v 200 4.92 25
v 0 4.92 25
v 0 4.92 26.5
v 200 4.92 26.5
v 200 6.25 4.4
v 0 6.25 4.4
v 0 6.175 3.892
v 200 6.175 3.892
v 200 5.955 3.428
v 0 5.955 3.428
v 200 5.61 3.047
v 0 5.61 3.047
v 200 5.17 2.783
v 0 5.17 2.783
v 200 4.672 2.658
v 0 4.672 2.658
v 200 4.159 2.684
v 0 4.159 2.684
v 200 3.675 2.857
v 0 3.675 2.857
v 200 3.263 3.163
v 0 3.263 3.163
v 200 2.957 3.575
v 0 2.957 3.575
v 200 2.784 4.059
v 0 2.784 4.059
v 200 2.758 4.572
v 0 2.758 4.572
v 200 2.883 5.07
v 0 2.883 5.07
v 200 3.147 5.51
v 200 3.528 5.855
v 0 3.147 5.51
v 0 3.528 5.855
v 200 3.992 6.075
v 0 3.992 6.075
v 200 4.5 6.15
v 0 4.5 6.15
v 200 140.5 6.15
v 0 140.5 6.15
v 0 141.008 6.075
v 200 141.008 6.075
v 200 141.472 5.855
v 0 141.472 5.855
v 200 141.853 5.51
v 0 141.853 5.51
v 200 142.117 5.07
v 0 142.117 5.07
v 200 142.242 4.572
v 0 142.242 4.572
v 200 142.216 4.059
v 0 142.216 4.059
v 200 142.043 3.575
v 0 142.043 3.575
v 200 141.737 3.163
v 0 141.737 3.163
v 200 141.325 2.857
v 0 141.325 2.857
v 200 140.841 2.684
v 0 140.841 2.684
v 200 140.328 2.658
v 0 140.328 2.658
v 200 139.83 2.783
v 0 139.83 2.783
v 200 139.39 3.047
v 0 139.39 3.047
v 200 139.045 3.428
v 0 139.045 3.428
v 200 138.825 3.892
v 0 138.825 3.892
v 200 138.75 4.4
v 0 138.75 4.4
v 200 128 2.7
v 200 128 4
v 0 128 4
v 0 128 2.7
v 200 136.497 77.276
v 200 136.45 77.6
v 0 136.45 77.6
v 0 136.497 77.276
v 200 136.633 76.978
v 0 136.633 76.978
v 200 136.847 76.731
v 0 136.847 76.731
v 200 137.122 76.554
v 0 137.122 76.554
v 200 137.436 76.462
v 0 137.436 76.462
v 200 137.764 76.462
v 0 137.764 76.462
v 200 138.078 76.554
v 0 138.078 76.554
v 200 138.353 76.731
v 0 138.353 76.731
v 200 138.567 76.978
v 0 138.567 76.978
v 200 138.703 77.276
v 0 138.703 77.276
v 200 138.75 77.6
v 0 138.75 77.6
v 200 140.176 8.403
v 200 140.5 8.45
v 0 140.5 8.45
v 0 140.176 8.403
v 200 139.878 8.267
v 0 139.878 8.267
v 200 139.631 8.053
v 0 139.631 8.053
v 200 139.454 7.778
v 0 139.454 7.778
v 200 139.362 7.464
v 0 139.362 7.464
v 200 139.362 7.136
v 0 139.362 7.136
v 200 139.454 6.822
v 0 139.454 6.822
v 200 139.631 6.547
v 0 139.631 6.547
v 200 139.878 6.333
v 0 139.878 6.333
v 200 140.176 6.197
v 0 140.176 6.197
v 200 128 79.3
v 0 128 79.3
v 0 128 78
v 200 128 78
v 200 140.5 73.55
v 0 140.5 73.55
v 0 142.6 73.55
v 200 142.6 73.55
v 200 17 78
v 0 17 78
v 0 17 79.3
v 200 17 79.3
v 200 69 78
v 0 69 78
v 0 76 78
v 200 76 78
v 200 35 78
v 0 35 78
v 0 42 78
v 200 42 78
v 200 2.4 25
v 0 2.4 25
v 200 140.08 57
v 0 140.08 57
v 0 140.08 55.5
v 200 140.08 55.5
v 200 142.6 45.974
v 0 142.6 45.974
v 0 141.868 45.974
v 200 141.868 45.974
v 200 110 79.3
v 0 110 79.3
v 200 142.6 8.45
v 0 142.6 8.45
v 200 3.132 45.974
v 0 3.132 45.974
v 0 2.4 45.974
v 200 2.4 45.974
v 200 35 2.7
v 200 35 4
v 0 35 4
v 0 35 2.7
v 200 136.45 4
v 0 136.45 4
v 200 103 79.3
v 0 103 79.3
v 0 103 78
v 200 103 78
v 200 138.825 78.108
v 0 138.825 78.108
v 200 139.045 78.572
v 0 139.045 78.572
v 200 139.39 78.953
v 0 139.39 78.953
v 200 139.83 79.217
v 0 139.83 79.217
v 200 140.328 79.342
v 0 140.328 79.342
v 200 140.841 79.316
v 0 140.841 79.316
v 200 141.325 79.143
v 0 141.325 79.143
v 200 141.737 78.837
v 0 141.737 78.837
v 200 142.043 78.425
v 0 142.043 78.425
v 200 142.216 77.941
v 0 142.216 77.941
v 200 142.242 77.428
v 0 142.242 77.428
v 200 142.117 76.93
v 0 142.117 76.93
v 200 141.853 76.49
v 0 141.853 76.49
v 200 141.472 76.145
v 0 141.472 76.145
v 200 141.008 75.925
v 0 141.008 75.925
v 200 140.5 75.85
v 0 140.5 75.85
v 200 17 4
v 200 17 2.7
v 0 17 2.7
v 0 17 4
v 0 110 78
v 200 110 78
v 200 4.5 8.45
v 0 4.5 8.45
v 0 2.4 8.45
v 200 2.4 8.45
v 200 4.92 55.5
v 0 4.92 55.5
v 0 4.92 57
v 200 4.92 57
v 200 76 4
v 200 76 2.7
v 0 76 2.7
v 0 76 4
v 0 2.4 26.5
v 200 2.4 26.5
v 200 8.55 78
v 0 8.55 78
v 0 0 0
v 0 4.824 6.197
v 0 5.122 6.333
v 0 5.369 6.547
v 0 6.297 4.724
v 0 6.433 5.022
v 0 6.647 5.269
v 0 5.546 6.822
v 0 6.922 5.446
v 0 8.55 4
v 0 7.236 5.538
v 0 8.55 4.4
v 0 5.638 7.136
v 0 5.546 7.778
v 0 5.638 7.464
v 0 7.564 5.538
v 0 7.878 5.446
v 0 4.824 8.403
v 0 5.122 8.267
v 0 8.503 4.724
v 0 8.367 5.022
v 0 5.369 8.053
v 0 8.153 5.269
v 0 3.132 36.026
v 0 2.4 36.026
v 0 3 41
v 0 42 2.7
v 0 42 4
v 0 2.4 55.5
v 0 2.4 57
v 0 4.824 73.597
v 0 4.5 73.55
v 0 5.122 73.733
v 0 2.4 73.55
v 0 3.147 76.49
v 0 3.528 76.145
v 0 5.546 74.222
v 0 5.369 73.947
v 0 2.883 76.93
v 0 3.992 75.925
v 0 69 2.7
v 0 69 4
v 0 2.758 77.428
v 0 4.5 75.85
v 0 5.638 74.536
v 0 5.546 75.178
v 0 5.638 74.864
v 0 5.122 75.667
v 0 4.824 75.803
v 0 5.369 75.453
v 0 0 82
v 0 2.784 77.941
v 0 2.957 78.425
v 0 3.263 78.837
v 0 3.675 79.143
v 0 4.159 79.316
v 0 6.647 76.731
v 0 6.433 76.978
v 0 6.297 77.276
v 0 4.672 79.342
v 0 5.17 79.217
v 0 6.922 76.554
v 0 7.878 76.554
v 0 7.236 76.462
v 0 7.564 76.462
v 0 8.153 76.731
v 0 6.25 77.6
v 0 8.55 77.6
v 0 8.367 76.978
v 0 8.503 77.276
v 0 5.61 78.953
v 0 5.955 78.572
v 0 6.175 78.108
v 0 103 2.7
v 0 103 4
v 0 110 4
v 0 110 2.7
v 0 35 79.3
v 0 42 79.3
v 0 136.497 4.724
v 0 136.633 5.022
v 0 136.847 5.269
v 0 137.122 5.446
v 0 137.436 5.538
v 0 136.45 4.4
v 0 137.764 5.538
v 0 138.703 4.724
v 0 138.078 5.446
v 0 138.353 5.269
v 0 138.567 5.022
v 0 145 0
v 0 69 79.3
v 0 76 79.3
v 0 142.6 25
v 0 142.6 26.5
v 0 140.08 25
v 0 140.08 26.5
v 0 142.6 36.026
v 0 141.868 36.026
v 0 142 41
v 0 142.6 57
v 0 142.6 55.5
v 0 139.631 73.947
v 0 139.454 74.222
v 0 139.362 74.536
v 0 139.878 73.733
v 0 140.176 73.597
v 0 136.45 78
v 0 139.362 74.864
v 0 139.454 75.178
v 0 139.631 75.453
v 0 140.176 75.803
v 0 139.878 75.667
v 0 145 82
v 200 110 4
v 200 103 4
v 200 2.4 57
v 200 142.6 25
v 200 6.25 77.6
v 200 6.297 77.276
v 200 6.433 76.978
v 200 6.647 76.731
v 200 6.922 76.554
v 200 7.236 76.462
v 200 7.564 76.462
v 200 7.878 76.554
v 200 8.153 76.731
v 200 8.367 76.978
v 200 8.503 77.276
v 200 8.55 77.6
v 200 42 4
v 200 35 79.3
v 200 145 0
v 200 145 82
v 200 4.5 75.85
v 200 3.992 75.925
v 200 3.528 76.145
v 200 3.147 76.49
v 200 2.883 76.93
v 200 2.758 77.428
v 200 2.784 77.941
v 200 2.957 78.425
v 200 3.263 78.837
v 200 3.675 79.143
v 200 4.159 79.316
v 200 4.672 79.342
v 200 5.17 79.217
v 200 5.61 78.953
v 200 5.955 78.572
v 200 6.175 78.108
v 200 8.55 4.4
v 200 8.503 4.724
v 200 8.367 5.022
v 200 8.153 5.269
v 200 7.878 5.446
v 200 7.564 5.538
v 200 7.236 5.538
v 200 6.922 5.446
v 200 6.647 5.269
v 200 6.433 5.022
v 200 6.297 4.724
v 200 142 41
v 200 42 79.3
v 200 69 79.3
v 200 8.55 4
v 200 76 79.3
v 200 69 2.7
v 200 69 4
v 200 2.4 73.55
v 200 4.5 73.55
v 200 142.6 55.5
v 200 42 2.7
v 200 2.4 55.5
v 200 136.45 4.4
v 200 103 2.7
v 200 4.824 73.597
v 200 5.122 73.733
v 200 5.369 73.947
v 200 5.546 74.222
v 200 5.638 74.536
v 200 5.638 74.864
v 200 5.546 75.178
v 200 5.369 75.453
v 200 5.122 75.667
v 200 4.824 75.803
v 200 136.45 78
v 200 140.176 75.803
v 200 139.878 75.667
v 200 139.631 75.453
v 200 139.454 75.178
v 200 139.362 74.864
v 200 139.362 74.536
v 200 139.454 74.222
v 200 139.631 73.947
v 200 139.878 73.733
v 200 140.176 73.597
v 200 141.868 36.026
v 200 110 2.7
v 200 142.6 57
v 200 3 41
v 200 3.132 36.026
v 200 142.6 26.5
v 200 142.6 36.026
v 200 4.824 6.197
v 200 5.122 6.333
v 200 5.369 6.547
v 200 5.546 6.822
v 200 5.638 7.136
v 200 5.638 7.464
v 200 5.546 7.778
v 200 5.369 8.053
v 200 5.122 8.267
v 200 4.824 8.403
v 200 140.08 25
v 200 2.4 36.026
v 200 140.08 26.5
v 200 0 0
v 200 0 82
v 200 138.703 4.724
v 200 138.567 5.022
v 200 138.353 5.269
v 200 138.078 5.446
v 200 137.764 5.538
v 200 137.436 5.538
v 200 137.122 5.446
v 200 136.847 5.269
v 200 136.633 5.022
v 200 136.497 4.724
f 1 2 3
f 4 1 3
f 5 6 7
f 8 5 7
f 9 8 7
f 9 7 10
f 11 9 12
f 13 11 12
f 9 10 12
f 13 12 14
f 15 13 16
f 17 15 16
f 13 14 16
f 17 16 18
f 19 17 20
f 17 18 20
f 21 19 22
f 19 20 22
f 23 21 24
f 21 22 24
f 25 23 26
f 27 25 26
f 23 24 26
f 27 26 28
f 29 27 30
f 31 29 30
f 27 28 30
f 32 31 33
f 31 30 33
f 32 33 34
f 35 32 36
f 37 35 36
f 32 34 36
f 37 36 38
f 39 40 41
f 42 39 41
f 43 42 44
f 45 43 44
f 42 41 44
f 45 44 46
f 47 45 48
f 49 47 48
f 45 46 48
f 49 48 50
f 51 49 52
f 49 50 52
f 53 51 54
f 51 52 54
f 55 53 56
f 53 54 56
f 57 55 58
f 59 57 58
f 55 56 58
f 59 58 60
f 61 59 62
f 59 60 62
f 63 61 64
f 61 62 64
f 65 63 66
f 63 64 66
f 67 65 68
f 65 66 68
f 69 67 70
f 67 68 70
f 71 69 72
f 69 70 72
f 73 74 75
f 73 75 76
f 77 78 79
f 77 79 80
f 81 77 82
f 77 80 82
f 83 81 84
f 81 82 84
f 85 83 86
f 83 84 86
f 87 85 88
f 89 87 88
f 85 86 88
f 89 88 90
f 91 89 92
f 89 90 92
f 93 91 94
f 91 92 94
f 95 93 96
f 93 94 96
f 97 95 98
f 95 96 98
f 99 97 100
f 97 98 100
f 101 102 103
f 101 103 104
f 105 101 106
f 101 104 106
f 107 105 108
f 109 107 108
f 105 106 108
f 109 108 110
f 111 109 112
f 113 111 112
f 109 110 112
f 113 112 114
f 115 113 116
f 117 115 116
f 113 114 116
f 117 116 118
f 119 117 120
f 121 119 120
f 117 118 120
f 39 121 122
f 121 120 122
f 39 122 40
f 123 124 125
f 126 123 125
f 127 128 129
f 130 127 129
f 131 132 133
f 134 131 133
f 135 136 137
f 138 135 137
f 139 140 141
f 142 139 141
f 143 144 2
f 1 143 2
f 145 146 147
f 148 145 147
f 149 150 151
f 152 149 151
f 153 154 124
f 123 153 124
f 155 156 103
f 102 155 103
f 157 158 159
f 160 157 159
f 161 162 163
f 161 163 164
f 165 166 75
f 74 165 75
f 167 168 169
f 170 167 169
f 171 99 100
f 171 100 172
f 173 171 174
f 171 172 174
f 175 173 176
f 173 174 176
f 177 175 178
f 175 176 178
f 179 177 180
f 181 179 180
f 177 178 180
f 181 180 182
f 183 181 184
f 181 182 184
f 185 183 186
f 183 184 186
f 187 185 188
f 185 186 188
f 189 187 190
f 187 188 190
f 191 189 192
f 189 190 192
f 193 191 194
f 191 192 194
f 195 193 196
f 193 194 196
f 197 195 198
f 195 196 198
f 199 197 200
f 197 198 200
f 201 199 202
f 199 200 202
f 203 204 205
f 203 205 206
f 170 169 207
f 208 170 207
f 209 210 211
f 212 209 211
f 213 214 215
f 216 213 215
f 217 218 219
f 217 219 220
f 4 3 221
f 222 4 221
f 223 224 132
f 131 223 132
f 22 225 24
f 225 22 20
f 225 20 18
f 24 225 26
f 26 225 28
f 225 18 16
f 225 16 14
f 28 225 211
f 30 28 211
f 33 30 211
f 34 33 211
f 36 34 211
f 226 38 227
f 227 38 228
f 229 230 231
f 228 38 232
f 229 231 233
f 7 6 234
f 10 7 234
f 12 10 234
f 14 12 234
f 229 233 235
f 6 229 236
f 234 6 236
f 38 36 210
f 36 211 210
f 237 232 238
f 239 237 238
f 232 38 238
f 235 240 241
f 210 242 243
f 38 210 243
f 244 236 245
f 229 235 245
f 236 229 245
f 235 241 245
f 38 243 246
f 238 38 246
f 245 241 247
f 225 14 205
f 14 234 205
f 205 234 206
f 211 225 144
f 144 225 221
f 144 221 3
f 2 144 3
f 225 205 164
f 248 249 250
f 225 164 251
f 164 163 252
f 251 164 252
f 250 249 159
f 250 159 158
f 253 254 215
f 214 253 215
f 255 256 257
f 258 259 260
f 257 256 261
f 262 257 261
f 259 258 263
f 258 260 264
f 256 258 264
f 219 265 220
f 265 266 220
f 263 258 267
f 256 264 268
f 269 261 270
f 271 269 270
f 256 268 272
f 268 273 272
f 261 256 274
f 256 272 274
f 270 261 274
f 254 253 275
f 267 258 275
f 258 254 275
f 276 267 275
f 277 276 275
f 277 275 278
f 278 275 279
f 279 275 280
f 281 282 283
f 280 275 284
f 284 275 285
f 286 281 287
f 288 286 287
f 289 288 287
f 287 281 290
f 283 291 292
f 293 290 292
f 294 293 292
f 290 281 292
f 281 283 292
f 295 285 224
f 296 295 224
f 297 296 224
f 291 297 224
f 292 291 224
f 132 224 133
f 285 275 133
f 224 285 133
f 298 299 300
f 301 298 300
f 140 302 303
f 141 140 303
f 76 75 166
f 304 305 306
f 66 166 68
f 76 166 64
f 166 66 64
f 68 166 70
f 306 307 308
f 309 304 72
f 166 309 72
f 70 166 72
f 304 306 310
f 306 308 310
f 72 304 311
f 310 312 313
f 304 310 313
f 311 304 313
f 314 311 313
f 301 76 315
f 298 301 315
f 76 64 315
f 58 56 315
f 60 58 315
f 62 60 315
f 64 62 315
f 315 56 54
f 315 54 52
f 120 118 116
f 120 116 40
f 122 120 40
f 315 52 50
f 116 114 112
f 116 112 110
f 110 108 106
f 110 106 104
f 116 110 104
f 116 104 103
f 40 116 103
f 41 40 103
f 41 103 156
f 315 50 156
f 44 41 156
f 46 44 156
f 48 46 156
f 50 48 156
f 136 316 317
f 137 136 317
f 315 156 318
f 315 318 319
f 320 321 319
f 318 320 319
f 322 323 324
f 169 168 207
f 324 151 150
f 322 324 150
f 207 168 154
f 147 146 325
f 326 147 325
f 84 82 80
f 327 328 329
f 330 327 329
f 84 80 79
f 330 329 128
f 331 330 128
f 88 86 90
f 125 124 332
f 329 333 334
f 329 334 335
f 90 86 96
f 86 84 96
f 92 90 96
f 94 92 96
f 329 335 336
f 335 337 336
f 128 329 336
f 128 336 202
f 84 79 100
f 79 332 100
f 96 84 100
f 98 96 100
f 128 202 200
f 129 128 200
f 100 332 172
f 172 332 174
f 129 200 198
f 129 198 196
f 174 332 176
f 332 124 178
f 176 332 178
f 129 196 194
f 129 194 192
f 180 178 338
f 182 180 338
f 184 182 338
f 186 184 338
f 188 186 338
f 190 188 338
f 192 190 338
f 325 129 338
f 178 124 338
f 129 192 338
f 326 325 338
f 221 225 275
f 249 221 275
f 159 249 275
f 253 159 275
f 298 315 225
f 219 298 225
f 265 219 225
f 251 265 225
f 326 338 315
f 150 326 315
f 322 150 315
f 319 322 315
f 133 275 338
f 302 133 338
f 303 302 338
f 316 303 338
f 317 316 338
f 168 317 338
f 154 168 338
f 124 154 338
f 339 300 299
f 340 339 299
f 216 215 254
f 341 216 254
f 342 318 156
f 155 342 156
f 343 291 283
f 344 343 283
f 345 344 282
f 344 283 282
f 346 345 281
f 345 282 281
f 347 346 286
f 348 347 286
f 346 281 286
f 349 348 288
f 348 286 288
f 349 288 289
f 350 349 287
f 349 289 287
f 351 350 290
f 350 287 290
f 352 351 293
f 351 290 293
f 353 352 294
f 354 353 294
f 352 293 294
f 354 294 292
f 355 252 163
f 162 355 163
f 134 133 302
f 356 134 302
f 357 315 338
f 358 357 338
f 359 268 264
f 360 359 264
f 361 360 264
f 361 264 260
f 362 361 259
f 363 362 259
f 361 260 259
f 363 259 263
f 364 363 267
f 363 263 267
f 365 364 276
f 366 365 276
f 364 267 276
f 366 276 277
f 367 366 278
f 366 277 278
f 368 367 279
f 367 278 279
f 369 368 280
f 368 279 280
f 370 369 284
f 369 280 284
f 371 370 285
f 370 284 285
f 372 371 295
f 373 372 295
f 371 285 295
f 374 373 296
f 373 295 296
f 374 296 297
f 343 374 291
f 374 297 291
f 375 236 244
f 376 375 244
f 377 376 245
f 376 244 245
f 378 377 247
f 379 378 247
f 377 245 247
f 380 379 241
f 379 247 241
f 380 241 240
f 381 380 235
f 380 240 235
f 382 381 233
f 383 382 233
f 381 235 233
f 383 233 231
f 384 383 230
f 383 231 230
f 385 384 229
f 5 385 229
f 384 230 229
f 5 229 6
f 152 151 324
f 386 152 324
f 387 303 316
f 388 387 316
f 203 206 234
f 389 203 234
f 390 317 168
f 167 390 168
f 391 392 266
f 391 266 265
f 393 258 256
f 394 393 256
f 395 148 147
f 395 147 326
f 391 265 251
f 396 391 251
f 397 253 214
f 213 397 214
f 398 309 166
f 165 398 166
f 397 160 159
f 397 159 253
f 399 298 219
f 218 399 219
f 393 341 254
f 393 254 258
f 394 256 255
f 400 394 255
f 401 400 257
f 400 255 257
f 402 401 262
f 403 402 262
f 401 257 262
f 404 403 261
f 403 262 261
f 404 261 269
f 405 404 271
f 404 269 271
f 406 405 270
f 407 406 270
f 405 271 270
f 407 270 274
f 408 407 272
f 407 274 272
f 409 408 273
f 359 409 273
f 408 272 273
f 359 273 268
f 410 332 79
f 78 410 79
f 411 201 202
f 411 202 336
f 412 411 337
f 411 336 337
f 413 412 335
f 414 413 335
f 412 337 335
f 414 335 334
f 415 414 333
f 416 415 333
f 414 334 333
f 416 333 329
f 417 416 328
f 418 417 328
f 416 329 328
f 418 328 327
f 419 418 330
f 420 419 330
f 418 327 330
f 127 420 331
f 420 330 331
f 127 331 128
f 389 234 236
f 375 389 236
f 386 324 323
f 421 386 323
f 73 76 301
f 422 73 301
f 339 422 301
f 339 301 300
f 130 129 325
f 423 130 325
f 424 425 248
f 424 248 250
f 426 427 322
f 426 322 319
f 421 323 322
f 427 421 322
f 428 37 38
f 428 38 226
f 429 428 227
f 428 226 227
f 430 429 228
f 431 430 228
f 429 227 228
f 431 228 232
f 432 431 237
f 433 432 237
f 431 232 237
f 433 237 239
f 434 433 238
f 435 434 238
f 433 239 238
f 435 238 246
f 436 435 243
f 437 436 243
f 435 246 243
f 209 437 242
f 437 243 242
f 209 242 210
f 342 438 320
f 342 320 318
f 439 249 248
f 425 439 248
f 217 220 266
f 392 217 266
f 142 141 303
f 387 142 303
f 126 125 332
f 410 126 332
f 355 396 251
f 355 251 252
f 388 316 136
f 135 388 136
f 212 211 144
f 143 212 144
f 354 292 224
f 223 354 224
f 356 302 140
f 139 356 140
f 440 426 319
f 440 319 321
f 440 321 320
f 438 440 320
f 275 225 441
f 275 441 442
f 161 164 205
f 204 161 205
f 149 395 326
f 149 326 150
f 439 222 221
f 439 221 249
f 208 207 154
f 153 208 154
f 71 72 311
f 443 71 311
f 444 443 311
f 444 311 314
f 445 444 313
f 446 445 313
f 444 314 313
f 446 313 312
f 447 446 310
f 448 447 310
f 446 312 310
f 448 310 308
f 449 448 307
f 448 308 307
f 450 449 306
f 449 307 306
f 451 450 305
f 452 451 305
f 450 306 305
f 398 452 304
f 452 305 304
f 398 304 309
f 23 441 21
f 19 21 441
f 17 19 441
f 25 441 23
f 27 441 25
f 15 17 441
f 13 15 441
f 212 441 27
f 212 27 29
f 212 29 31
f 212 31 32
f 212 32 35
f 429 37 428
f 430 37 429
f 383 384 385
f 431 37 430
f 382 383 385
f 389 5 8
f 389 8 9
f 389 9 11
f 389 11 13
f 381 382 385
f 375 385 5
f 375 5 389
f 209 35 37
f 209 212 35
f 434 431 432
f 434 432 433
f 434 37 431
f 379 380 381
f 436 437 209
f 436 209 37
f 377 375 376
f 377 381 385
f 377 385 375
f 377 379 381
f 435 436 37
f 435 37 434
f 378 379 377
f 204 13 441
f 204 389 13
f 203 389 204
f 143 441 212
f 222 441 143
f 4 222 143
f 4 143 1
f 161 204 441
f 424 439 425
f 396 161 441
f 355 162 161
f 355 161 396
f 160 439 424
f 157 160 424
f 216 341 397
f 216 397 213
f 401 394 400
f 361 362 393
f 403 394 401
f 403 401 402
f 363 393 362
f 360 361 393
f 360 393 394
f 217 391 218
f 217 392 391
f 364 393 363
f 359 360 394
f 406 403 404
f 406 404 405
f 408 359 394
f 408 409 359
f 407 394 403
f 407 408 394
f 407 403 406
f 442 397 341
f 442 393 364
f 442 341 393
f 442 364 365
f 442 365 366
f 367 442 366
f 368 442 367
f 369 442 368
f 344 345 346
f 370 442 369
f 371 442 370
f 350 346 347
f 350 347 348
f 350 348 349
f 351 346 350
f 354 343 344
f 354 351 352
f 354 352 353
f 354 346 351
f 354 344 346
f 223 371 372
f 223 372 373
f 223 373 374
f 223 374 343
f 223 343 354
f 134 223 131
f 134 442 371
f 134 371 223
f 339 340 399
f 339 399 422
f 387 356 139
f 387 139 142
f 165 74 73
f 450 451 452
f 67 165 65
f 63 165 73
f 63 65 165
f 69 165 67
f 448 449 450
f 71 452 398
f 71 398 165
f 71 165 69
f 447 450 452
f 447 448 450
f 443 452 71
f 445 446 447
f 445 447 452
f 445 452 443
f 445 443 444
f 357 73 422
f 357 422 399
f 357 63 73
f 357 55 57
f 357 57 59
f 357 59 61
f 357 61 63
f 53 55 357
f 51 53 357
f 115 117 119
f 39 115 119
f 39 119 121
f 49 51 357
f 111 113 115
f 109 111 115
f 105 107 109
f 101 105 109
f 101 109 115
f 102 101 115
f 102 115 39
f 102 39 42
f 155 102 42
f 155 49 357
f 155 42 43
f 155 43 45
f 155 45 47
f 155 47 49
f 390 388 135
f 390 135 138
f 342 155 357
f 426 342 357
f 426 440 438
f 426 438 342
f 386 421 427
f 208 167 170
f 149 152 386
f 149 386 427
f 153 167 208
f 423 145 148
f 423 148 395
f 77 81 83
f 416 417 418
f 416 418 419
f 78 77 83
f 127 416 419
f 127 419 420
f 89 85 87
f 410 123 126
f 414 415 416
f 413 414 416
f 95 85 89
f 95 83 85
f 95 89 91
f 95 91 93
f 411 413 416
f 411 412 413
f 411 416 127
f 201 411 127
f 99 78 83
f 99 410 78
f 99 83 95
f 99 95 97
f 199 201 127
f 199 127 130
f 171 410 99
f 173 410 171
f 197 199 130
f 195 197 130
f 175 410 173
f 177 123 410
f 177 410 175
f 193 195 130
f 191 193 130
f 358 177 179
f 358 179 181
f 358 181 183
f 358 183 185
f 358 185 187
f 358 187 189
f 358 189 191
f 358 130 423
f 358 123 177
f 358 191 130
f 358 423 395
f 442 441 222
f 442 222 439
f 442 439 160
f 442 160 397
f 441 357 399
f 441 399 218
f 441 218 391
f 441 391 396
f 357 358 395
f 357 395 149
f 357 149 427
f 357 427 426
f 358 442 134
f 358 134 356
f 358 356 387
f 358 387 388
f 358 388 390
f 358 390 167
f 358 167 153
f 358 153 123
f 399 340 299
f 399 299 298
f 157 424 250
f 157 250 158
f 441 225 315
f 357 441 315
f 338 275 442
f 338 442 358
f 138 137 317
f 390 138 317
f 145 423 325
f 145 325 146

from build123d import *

# Parameters (mm, degrees)
F0_W     = 145
F0_H     = 82
F1_DEPTH = 200


with BuildPart() as f1:
    # F0 (on Right) → F1 (new body)
    with BuildSketch(Plane.YZ):
        with Locations((72.5, 41)):
            Rectangle(F0_W, F0_H)
        with BuildLine():
            Line((69, 78), (72.5, 78))
            Line((72.5, 78), (76, 78))
            Line((76, 78), (76, 79.3))
            Line((76, 79.3), (103, 79.3))
            Line((103, 79.3), (103, 78))
            Line((103, 78), (110, 78))
            Line((110, 78), (110, 79.3))
            Line((110, 79.3), (128, 79.3))
            Line((128, 79.3), (128, 78))
            Line((128, 78), (136.45, 78))
            Line((136.45, 78), (136.45, 77.6))
            ThreePointArc((136.45, 77.6), (137.6, 76.45), (138.75, 77.6))
            ThreePointArc((138.75, 77.6), (141.7374368671, 78.8374368671), (140.5, 75.85))
            ThreePointArc((140.5, 75.85), (139.35, 74.7), (140.5, 73.55))
            Line((140.5, 73.55), (142.6, 73.55))
            Line((142.6, 73.55), (142.6, 57))
            Line((142.6, 57), (140.0795047916, 57))
            Line((140.0795047916, 57), (140.0795047916, 55.5))
            Line((140.0795047916, 55.5), (142.6, 55.5))
            Line((142.6, 55.5), (142.6, 45.9740793705))
            Line((142.6, 45.9740793705), (141.8683309853, 45.9740793705))
            Line((141.8683309853, 45.9740793705), (142, 41))
            Line((142, 41), (141.8683309853, 36.0259206295))
            Line((141.8683309853, 36.0259206295), (142.6, 36.0259206295))
            Line((142.6, 36.0259206295), (142.6, 26.5))
            Line((142.6, 26.5), (140.0795047916, 26.5))
            Line((140.0795047916, 26.5), (140.0795047916, 25))
            Line((140.0795047916, 25), (142.6, 25))
            Line((142.6, 25), (142.6, 8.45))
            Line((142.6, 8.45), (140.5, 8.45))
            ThreePointArc((140.5, 8.45), (139.35, 7.3), (140.5, 6.15))
            ThreePointArc((140.5, 6.15), (141.7374368671, 3.1625631329), (138.75, 4.4))
            ThreePointArc((138.75, 4.4), (137.6, 5.55), (136.45, 4.4))
            Line((136.45, 4.4), (136.45, 4))
            Line((136.45, 4), (128, 4))
            Line((128, 4), (128, 2.7))
            Line((128, 2.7), (110, 2.7))
            Line((110, 2.7), (110, 4))
            Line((110, 4), (103, 4))
            Line((103, 4), (103, 2.7))
            Line((103, 2.7), (76, 2.7))
            Line((76, 2.7), (76, 4))
            Line((76, 4), (72.5, 4))
            Line((72.5, 4), (69, 4))
            Line((69, 4), (69, 2.7))
            Line((69, 2.7), (42, 2.7))
            Line((42, 2.7), (42, 4))
            Line((42, 4), (35, 4))
            Line((35, 4), (35, 2.7))
            Line((35, 2.7), (17, 2.7))
            Line((17, 2.7), (17, 4))
            Line((17, 4), (8.55, 4))
            Line((8.55, 4), (8.55, 4.4))
            ThreePointArc((8.55, 4.4), (7.4, 5.55), (6.25, 4.4))
            ThreePointArc((6.25, 4.4), (3.2625631329, 3.1625631329), (4.5, 6.15))
            ThreePointArc((4.5, 6.15), (5.65, 7.3), (4.5, 8.45))
            Line((4.5, 8.45), (2.4, 8.45))
            Line((2.4, 8.45), (2.4, 25))
            Line((2.4, 25), (4.9204952084, 25))
            Line((4.9204952084, 25), (4.9204952084, 26.5))
            Line((4.9204952084, 26.5), (2.4, 26.5))
            Line((2.4, 26.5), (2.4, 36.0259206295))
            Line((2.4, 36.0259206295), (3.1316690147, 36.0259206295))
            Line((3.1316690147, 36.0259206295), (3, 41))
            Line((3, 41), (3.1316690147, 45.9740793705))
            Line((3.1316690147, 45.9740793705), (2.4, 45.9740793705))
            Line((2.4, 45.9740793705), (2.4, 55.5))
            Line((2.4, 55.5), (4.9204952084, 55.5))
            Line((4.9204952084, 55.5), (4.9204952084, 57))
            Line((4.9204952084, 57), (2.4, 57))
            Line((2.4, 57), (2.4, 73.55))
            Line((2.4, 73.55), (4.5, 73.55))
            ThreePointArc((4.5, 73.55), (5.65, 74.7), (4.5, 75.85))
            ThreePointArc((4.5, 75.85), (3.2625631329, 78.8374368671), (6.25, 77.6))
            ThreePointArc((6.25, 77.6), (7.4, 76.45), (8.55, 77.6))
            Line((8.55, 77.6), (8.55, 78))
            Line((8.55, 78), (17, 78))
            Line((17, 78), (17, 79.3))
            Line((17, 79.3), (35, 79.3))
            Line((35, 79.3), (35, 78))
            Line((35, 78), (42, 78))
            Line((42, 78), (42, 79.3))
            Line((42, 79.3), (69, 79.3))
            Line((69, 79.3), (69, 78))
        make_face(mode=Mode.SUBTRACT)
    extrude(amount=F1_DEPTH)


solid = f1.part
